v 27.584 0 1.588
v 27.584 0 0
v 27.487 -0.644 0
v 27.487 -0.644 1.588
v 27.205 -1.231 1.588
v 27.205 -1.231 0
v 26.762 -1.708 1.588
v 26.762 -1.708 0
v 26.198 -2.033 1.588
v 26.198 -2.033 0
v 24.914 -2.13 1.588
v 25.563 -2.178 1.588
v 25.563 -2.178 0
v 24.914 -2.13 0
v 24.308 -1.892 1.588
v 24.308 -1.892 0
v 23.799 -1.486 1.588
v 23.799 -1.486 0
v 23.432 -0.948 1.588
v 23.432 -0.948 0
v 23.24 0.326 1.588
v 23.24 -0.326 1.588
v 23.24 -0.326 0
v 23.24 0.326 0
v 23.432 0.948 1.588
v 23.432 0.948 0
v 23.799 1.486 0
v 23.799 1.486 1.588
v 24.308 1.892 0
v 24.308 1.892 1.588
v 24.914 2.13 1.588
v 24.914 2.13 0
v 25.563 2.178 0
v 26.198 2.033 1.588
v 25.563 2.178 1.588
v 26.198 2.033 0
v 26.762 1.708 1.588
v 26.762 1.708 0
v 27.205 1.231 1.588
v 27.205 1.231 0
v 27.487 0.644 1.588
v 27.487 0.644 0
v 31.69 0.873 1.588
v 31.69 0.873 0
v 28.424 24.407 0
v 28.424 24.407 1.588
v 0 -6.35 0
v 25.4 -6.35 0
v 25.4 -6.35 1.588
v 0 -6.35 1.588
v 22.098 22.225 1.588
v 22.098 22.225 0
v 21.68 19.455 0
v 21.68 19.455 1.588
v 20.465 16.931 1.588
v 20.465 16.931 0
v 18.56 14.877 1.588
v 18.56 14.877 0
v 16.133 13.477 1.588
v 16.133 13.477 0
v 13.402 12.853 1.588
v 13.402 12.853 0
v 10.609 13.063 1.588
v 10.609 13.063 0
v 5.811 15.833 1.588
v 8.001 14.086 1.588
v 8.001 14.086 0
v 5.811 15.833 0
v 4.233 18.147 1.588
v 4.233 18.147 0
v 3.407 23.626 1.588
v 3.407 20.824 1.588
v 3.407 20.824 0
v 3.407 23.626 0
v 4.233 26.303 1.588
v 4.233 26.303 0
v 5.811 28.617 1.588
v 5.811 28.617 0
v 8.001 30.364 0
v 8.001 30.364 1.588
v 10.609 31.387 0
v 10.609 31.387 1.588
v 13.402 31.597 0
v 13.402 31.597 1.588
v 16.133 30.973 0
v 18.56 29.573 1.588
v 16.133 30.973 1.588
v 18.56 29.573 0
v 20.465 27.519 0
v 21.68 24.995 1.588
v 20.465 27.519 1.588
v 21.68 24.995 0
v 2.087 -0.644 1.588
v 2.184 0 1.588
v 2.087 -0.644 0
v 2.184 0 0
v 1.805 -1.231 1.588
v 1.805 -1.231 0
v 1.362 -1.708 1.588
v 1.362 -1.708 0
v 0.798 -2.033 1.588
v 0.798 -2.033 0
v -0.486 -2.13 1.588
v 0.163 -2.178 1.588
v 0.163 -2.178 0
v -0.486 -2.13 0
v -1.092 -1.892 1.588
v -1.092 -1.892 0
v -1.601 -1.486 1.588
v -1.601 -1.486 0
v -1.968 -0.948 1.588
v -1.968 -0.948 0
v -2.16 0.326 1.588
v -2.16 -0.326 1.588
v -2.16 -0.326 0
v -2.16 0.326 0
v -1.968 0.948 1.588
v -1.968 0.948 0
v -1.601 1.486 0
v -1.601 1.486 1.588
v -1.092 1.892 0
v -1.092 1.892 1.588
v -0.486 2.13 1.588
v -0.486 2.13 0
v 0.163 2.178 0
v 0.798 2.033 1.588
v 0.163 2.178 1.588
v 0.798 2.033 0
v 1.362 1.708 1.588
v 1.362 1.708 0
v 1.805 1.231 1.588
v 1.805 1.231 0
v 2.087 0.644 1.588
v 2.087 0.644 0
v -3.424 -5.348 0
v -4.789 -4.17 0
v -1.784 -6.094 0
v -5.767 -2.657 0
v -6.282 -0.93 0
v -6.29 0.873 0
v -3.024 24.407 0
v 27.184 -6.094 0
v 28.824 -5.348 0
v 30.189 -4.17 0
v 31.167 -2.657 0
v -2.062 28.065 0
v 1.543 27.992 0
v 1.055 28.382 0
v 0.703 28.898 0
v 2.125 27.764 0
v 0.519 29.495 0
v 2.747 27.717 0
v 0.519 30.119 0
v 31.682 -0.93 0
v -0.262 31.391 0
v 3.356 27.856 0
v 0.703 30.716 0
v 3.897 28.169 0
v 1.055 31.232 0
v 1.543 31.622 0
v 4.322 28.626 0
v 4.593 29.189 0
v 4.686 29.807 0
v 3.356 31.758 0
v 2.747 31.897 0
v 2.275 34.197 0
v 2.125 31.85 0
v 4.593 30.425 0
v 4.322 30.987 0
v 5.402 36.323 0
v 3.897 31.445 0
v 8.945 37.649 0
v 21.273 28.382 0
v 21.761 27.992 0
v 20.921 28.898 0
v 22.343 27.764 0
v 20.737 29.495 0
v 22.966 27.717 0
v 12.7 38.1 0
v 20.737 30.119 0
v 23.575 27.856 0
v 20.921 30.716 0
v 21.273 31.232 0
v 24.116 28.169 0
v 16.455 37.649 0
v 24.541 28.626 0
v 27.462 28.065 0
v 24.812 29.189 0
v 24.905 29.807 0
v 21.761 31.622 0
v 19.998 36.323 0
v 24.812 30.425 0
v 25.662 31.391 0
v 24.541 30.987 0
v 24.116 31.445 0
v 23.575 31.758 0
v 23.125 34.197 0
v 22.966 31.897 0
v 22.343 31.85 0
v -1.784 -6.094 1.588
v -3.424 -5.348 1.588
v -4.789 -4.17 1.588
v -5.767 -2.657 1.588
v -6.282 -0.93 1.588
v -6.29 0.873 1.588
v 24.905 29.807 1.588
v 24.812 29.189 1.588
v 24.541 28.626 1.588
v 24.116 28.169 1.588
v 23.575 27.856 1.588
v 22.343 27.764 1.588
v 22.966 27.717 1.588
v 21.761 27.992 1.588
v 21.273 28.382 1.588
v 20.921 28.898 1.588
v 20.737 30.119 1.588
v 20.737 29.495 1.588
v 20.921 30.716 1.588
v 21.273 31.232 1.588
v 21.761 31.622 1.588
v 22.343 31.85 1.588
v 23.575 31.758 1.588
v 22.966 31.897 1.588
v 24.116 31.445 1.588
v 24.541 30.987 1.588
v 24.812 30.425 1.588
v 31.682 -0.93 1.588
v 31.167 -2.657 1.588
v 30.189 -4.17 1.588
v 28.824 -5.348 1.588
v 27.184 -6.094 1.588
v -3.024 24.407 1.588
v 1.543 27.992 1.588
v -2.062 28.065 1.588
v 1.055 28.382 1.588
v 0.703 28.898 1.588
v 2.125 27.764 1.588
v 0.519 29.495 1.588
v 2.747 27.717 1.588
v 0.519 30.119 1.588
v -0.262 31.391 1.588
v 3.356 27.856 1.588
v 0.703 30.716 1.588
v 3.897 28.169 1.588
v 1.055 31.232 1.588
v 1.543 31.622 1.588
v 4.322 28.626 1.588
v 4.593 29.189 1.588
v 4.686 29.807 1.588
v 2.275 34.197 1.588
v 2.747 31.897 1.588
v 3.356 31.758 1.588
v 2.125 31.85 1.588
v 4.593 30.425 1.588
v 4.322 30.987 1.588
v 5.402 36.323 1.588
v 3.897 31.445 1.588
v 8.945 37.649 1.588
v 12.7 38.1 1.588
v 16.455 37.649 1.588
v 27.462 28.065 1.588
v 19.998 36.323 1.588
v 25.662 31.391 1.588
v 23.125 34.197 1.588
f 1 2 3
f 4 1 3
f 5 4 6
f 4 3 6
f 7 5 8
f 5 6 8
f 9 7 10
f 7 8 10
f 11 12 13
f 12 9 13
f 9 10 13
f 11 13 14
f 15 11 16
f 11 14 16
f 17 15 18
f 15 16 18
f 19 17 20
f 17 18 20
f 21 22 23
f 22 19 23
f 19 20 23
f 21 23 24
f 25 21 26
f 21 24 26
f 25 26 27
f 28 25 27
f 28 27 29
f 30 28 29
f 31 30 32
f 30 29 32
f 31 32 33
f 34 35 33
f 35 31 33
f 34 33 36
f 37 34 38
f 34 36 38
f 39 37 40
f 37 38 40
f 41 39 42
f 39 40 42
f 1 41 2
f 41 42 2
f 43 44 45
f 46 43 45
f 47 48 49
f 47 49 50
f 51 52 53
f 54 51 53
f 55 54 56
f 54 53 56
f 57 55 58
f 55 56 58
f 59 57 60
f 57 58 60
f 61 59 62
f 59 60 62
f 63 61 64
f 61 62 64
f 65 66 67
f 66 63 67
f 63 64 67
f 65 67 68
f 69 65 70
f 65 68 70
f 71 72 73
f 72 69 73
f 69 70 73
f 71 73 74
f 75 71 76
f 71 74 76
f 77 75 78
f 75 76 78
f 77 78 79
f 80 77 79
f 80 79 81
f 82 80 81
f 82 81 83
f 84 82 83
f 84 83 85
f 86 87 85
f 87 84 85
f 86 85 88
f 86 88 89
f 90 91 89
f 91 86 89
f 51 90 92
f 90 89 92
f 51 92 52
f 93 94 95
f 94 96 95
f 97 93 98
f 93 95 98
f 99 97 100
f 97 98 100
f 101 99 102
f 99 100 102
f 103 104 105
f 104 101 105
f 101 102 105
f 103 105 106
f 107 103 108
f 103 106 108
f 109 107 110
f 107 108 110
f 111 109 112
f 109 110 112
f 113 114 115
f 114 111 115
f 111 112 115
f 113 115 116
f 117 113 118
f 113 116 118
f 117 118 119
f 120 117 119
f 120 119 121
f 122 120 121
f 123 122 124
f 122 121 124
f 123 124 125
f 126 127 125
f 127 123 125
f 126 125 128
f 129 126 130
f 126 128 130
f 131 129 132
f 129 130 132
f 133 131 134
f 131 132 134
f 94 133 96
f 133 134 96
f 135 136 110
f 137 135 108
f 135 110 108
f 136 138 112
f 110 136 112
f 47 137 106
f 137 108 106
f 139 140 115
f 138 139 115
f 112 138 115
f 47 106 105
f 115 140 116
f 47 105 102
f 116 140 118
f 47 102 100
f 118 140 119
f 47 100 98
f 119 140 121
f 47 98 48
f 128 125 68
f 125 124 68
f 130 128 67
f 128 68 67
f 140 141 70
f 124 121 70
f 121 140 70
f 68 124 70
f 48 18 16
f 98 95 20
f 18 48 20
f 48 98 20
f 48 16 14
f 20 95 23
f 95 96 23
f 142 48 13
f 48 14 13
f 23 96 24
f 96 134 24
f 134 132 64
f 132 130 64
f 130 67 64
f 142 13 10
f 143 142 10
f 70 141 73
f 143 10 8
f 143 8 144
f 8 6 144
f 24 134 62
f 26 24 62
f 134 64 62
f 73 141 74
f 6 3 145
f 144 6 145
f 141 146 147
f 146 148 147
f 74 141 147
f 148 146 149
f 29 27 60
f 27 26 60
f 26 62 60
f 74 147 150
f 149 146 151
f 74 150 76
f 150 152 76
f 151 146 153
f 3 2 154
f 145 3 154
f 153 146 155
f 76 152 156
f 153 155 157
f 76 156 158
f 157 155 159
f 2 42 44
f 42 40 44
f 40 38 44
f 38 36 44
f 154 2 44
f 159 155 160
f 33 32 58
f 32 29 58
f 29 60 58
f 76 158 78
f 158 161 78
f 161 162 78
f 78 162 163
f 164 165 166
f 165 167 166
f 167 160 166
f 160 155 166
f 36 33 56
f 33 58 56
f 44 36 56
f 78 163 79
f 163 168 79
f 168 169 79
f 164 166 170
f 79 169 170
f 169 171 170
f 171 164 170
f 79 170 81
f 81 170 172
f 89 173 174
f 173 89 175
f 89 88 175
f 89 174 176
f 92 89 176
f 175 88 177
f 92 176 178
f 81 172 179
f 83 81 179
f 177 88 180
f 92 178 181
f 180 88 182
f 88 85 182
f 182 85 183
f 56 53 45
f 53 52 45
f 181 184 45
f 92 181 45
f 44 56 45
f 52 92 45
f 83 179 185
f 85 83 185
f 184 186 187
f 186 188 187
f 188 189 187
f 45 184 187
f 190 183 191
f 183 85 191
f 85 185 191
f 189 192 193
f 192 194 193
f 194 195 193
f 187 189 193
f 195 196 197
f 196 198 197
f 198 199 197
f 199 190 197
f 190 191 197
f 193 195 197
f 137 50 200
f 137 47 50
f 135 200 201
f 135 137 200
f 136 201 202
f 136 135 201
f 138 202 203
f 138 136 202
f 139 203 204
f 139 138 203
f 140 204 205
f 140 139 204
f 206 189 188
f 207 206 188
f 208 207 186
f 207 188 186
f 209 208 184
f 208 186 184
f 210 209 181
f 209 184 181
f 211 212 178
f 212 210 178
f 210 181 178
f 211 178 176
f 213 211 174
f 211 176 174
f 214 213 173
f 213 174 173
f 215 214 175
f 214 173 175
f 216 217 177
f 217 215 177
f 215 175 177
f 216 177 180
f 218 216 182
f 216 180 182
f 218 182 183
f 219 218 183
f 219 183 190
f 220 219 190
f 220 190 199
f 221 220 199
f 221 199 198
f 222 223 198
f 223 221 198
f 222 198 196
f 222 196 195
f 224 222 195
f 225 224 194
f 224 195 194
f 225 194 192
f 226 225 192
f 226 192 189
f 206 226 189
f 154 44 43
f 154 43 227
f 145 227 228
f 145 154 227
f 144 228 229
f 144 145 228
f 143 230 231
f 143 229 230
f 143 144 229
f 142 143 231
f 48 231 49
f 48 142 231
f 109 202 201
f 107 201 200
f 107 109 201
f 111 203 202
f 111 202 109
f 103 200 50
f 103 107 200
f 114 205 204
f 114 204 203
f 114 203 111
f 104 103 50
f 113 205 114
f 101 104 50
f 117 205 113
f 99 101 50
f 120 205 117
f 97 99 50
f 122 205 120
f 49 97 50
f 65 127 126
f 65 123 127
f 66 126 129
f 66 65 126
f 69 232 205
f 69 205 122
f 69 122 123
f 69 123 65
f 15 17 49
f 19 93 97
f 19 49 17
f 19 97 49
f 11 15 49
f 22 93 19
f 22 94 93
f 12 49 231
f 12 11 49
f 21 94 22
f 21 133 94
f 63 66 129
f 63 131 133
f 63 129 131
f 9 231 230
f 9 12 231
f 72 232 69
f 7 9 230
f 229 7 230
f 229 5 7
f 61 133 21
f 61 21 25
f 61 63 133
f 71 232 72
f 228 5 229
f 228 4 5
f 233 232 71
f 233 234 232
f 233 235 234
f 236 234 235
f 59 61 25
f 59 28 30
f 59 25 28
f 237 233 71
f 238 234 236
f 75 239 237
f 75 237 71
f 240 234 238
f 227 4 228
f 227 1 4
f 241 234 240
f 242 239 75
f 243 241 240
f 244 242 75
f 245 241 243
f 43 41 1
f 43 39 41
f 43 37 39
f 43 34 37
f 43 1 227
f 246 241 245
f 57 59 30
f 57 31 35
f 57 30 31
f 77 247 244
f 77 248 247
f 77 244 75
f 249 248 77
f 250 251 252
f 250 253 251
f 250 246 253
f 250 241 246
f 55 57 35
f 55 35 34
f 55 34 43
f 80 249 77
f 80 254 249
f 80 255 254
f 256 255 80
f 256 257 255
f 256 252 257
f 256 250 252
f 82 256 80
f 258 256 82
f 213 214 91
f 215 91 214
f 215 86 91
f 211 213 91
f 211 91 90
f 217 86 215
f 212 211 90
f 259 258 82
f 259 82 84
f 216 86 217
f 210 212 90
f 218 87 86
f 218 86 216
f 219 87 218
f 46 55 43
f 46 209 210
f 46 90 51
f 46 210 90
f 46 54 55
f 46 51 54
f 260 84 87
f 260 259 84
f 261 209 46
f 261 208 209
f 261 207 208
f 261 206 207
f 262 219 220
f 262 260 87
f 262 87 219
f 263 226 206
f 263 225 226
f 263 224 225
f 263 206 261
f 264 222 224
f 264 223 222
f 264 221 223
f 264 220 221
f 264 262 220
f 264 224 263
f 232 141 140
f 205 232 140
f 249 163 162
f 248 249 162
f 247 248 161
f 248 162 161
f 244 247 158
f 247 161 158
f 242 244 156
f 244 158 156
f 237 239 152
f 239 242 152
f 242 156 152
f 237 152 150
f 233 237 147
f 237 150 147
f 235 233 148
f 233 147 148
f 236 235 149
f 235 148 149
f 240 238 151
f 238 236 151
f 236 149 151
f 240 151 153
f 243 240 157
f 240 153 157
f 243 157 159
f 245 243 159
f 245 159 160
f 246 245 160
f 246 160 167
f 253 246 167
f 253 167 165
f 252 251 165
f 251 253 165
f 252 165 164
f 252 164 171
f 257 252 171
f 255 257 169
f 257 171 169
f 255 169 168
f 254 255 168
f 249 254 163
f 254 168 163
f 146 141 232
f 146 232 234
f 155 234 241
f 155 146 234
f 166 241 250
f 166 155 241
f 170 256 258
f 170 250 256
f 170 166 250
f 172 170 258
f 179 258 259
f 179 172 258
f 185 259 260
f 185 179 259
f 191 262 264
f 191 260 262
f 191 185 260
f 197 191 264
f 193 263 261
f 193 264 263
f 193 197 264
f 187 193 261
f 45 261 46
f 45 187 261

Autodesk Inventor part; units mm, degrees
ref_plane "YZ Plane" through (0, 0, 0) normal (1, 0, 0) x (0, 1, 0)
ref_plane "XZ Plane" through (0, 0, 0) normal (0, 1, 0) x (-1, 0, 0)
ref_plane "XY Plane" through (0, 0, 0) normal (0, 0, 1) x (1, 0, 0)
sketch "main" plane through (0, 0, 0) normal (0, 0, 1) x (1, 0, 0)
  circle A0 centre (70.448, 399.2567) radius 2.1844
  circle A1 centre (95.848, 399.2567) radius 2.1844
  circle A2 centre (83.148, 421.4817) radius 9.398
  arc A3 (95.848, 392.9067) -> (102.1377, 400.1294) centre (95.848, 399.2567) ccw
  arc A4 (64.1582, 400.1294) -> (70.448, 392.9067) centre (70.448, 399.2567) ccw
  line L0 (95.848, 392.9067) -> (70.448, 392.9067)
  arc A5 (98.8723, 423.6635) -> (67.4236, 423.6635) centre (83.148, 421.4817) ccw
  line L1 (102.1377, 400.1294) -> (98.8723, 423.6635)
  line L2 (67.4236, 423.6635) -> (64.1582, 400.1294)
  point P0 (83.148, 405.9327)
  dimension "d0" = 18.796
  dimension "d1" = 12.7
  dimension "d2" = 12.7
sketch "Sketch1" plane through (0, 0, 0) normal (0, 0, 1) x (1, 0, 0)
  circle A0 centre (2.5908, 29.8069) radius 2.0955
  circle A1 centre (22.8092, 29.8069) radius 2.0955
  circle A2 centre (0, 0) radius 2.1844
  circle A3 centre (25.4, 0) radius 2.1844
  circle A4 centre (12.7, 22.225) radius 9.398
  arc A5 (25.4, -6.35) -> (31.6897, 0.8727) centre (25.4, 0) ccw
  arc A6 (-6.2897, 0.8727) -> (0, -6.35) centre (0, 0) ccw
  line L0 (25.4, -6.35) -> (0, -6.35)
  arc A7 (28.4244, 24.4068) -> (-3.0244, 24.4068) centre (12.7, 22.225) ccw
  line L1 (31.6897, 0.8727) -> (28.4244, 24.4068)
  line L2 (-3.0244, 24.4068) -> (-6.2897, 0.8727)
  dimension "d5" = 4.191
  dimension "d6" = 4.191
extrude "Extrusion1" add sketch "Sketch1" along normal blind 1.5875
properties part number "resevoir_mount" material "Acetal Resin, White"
